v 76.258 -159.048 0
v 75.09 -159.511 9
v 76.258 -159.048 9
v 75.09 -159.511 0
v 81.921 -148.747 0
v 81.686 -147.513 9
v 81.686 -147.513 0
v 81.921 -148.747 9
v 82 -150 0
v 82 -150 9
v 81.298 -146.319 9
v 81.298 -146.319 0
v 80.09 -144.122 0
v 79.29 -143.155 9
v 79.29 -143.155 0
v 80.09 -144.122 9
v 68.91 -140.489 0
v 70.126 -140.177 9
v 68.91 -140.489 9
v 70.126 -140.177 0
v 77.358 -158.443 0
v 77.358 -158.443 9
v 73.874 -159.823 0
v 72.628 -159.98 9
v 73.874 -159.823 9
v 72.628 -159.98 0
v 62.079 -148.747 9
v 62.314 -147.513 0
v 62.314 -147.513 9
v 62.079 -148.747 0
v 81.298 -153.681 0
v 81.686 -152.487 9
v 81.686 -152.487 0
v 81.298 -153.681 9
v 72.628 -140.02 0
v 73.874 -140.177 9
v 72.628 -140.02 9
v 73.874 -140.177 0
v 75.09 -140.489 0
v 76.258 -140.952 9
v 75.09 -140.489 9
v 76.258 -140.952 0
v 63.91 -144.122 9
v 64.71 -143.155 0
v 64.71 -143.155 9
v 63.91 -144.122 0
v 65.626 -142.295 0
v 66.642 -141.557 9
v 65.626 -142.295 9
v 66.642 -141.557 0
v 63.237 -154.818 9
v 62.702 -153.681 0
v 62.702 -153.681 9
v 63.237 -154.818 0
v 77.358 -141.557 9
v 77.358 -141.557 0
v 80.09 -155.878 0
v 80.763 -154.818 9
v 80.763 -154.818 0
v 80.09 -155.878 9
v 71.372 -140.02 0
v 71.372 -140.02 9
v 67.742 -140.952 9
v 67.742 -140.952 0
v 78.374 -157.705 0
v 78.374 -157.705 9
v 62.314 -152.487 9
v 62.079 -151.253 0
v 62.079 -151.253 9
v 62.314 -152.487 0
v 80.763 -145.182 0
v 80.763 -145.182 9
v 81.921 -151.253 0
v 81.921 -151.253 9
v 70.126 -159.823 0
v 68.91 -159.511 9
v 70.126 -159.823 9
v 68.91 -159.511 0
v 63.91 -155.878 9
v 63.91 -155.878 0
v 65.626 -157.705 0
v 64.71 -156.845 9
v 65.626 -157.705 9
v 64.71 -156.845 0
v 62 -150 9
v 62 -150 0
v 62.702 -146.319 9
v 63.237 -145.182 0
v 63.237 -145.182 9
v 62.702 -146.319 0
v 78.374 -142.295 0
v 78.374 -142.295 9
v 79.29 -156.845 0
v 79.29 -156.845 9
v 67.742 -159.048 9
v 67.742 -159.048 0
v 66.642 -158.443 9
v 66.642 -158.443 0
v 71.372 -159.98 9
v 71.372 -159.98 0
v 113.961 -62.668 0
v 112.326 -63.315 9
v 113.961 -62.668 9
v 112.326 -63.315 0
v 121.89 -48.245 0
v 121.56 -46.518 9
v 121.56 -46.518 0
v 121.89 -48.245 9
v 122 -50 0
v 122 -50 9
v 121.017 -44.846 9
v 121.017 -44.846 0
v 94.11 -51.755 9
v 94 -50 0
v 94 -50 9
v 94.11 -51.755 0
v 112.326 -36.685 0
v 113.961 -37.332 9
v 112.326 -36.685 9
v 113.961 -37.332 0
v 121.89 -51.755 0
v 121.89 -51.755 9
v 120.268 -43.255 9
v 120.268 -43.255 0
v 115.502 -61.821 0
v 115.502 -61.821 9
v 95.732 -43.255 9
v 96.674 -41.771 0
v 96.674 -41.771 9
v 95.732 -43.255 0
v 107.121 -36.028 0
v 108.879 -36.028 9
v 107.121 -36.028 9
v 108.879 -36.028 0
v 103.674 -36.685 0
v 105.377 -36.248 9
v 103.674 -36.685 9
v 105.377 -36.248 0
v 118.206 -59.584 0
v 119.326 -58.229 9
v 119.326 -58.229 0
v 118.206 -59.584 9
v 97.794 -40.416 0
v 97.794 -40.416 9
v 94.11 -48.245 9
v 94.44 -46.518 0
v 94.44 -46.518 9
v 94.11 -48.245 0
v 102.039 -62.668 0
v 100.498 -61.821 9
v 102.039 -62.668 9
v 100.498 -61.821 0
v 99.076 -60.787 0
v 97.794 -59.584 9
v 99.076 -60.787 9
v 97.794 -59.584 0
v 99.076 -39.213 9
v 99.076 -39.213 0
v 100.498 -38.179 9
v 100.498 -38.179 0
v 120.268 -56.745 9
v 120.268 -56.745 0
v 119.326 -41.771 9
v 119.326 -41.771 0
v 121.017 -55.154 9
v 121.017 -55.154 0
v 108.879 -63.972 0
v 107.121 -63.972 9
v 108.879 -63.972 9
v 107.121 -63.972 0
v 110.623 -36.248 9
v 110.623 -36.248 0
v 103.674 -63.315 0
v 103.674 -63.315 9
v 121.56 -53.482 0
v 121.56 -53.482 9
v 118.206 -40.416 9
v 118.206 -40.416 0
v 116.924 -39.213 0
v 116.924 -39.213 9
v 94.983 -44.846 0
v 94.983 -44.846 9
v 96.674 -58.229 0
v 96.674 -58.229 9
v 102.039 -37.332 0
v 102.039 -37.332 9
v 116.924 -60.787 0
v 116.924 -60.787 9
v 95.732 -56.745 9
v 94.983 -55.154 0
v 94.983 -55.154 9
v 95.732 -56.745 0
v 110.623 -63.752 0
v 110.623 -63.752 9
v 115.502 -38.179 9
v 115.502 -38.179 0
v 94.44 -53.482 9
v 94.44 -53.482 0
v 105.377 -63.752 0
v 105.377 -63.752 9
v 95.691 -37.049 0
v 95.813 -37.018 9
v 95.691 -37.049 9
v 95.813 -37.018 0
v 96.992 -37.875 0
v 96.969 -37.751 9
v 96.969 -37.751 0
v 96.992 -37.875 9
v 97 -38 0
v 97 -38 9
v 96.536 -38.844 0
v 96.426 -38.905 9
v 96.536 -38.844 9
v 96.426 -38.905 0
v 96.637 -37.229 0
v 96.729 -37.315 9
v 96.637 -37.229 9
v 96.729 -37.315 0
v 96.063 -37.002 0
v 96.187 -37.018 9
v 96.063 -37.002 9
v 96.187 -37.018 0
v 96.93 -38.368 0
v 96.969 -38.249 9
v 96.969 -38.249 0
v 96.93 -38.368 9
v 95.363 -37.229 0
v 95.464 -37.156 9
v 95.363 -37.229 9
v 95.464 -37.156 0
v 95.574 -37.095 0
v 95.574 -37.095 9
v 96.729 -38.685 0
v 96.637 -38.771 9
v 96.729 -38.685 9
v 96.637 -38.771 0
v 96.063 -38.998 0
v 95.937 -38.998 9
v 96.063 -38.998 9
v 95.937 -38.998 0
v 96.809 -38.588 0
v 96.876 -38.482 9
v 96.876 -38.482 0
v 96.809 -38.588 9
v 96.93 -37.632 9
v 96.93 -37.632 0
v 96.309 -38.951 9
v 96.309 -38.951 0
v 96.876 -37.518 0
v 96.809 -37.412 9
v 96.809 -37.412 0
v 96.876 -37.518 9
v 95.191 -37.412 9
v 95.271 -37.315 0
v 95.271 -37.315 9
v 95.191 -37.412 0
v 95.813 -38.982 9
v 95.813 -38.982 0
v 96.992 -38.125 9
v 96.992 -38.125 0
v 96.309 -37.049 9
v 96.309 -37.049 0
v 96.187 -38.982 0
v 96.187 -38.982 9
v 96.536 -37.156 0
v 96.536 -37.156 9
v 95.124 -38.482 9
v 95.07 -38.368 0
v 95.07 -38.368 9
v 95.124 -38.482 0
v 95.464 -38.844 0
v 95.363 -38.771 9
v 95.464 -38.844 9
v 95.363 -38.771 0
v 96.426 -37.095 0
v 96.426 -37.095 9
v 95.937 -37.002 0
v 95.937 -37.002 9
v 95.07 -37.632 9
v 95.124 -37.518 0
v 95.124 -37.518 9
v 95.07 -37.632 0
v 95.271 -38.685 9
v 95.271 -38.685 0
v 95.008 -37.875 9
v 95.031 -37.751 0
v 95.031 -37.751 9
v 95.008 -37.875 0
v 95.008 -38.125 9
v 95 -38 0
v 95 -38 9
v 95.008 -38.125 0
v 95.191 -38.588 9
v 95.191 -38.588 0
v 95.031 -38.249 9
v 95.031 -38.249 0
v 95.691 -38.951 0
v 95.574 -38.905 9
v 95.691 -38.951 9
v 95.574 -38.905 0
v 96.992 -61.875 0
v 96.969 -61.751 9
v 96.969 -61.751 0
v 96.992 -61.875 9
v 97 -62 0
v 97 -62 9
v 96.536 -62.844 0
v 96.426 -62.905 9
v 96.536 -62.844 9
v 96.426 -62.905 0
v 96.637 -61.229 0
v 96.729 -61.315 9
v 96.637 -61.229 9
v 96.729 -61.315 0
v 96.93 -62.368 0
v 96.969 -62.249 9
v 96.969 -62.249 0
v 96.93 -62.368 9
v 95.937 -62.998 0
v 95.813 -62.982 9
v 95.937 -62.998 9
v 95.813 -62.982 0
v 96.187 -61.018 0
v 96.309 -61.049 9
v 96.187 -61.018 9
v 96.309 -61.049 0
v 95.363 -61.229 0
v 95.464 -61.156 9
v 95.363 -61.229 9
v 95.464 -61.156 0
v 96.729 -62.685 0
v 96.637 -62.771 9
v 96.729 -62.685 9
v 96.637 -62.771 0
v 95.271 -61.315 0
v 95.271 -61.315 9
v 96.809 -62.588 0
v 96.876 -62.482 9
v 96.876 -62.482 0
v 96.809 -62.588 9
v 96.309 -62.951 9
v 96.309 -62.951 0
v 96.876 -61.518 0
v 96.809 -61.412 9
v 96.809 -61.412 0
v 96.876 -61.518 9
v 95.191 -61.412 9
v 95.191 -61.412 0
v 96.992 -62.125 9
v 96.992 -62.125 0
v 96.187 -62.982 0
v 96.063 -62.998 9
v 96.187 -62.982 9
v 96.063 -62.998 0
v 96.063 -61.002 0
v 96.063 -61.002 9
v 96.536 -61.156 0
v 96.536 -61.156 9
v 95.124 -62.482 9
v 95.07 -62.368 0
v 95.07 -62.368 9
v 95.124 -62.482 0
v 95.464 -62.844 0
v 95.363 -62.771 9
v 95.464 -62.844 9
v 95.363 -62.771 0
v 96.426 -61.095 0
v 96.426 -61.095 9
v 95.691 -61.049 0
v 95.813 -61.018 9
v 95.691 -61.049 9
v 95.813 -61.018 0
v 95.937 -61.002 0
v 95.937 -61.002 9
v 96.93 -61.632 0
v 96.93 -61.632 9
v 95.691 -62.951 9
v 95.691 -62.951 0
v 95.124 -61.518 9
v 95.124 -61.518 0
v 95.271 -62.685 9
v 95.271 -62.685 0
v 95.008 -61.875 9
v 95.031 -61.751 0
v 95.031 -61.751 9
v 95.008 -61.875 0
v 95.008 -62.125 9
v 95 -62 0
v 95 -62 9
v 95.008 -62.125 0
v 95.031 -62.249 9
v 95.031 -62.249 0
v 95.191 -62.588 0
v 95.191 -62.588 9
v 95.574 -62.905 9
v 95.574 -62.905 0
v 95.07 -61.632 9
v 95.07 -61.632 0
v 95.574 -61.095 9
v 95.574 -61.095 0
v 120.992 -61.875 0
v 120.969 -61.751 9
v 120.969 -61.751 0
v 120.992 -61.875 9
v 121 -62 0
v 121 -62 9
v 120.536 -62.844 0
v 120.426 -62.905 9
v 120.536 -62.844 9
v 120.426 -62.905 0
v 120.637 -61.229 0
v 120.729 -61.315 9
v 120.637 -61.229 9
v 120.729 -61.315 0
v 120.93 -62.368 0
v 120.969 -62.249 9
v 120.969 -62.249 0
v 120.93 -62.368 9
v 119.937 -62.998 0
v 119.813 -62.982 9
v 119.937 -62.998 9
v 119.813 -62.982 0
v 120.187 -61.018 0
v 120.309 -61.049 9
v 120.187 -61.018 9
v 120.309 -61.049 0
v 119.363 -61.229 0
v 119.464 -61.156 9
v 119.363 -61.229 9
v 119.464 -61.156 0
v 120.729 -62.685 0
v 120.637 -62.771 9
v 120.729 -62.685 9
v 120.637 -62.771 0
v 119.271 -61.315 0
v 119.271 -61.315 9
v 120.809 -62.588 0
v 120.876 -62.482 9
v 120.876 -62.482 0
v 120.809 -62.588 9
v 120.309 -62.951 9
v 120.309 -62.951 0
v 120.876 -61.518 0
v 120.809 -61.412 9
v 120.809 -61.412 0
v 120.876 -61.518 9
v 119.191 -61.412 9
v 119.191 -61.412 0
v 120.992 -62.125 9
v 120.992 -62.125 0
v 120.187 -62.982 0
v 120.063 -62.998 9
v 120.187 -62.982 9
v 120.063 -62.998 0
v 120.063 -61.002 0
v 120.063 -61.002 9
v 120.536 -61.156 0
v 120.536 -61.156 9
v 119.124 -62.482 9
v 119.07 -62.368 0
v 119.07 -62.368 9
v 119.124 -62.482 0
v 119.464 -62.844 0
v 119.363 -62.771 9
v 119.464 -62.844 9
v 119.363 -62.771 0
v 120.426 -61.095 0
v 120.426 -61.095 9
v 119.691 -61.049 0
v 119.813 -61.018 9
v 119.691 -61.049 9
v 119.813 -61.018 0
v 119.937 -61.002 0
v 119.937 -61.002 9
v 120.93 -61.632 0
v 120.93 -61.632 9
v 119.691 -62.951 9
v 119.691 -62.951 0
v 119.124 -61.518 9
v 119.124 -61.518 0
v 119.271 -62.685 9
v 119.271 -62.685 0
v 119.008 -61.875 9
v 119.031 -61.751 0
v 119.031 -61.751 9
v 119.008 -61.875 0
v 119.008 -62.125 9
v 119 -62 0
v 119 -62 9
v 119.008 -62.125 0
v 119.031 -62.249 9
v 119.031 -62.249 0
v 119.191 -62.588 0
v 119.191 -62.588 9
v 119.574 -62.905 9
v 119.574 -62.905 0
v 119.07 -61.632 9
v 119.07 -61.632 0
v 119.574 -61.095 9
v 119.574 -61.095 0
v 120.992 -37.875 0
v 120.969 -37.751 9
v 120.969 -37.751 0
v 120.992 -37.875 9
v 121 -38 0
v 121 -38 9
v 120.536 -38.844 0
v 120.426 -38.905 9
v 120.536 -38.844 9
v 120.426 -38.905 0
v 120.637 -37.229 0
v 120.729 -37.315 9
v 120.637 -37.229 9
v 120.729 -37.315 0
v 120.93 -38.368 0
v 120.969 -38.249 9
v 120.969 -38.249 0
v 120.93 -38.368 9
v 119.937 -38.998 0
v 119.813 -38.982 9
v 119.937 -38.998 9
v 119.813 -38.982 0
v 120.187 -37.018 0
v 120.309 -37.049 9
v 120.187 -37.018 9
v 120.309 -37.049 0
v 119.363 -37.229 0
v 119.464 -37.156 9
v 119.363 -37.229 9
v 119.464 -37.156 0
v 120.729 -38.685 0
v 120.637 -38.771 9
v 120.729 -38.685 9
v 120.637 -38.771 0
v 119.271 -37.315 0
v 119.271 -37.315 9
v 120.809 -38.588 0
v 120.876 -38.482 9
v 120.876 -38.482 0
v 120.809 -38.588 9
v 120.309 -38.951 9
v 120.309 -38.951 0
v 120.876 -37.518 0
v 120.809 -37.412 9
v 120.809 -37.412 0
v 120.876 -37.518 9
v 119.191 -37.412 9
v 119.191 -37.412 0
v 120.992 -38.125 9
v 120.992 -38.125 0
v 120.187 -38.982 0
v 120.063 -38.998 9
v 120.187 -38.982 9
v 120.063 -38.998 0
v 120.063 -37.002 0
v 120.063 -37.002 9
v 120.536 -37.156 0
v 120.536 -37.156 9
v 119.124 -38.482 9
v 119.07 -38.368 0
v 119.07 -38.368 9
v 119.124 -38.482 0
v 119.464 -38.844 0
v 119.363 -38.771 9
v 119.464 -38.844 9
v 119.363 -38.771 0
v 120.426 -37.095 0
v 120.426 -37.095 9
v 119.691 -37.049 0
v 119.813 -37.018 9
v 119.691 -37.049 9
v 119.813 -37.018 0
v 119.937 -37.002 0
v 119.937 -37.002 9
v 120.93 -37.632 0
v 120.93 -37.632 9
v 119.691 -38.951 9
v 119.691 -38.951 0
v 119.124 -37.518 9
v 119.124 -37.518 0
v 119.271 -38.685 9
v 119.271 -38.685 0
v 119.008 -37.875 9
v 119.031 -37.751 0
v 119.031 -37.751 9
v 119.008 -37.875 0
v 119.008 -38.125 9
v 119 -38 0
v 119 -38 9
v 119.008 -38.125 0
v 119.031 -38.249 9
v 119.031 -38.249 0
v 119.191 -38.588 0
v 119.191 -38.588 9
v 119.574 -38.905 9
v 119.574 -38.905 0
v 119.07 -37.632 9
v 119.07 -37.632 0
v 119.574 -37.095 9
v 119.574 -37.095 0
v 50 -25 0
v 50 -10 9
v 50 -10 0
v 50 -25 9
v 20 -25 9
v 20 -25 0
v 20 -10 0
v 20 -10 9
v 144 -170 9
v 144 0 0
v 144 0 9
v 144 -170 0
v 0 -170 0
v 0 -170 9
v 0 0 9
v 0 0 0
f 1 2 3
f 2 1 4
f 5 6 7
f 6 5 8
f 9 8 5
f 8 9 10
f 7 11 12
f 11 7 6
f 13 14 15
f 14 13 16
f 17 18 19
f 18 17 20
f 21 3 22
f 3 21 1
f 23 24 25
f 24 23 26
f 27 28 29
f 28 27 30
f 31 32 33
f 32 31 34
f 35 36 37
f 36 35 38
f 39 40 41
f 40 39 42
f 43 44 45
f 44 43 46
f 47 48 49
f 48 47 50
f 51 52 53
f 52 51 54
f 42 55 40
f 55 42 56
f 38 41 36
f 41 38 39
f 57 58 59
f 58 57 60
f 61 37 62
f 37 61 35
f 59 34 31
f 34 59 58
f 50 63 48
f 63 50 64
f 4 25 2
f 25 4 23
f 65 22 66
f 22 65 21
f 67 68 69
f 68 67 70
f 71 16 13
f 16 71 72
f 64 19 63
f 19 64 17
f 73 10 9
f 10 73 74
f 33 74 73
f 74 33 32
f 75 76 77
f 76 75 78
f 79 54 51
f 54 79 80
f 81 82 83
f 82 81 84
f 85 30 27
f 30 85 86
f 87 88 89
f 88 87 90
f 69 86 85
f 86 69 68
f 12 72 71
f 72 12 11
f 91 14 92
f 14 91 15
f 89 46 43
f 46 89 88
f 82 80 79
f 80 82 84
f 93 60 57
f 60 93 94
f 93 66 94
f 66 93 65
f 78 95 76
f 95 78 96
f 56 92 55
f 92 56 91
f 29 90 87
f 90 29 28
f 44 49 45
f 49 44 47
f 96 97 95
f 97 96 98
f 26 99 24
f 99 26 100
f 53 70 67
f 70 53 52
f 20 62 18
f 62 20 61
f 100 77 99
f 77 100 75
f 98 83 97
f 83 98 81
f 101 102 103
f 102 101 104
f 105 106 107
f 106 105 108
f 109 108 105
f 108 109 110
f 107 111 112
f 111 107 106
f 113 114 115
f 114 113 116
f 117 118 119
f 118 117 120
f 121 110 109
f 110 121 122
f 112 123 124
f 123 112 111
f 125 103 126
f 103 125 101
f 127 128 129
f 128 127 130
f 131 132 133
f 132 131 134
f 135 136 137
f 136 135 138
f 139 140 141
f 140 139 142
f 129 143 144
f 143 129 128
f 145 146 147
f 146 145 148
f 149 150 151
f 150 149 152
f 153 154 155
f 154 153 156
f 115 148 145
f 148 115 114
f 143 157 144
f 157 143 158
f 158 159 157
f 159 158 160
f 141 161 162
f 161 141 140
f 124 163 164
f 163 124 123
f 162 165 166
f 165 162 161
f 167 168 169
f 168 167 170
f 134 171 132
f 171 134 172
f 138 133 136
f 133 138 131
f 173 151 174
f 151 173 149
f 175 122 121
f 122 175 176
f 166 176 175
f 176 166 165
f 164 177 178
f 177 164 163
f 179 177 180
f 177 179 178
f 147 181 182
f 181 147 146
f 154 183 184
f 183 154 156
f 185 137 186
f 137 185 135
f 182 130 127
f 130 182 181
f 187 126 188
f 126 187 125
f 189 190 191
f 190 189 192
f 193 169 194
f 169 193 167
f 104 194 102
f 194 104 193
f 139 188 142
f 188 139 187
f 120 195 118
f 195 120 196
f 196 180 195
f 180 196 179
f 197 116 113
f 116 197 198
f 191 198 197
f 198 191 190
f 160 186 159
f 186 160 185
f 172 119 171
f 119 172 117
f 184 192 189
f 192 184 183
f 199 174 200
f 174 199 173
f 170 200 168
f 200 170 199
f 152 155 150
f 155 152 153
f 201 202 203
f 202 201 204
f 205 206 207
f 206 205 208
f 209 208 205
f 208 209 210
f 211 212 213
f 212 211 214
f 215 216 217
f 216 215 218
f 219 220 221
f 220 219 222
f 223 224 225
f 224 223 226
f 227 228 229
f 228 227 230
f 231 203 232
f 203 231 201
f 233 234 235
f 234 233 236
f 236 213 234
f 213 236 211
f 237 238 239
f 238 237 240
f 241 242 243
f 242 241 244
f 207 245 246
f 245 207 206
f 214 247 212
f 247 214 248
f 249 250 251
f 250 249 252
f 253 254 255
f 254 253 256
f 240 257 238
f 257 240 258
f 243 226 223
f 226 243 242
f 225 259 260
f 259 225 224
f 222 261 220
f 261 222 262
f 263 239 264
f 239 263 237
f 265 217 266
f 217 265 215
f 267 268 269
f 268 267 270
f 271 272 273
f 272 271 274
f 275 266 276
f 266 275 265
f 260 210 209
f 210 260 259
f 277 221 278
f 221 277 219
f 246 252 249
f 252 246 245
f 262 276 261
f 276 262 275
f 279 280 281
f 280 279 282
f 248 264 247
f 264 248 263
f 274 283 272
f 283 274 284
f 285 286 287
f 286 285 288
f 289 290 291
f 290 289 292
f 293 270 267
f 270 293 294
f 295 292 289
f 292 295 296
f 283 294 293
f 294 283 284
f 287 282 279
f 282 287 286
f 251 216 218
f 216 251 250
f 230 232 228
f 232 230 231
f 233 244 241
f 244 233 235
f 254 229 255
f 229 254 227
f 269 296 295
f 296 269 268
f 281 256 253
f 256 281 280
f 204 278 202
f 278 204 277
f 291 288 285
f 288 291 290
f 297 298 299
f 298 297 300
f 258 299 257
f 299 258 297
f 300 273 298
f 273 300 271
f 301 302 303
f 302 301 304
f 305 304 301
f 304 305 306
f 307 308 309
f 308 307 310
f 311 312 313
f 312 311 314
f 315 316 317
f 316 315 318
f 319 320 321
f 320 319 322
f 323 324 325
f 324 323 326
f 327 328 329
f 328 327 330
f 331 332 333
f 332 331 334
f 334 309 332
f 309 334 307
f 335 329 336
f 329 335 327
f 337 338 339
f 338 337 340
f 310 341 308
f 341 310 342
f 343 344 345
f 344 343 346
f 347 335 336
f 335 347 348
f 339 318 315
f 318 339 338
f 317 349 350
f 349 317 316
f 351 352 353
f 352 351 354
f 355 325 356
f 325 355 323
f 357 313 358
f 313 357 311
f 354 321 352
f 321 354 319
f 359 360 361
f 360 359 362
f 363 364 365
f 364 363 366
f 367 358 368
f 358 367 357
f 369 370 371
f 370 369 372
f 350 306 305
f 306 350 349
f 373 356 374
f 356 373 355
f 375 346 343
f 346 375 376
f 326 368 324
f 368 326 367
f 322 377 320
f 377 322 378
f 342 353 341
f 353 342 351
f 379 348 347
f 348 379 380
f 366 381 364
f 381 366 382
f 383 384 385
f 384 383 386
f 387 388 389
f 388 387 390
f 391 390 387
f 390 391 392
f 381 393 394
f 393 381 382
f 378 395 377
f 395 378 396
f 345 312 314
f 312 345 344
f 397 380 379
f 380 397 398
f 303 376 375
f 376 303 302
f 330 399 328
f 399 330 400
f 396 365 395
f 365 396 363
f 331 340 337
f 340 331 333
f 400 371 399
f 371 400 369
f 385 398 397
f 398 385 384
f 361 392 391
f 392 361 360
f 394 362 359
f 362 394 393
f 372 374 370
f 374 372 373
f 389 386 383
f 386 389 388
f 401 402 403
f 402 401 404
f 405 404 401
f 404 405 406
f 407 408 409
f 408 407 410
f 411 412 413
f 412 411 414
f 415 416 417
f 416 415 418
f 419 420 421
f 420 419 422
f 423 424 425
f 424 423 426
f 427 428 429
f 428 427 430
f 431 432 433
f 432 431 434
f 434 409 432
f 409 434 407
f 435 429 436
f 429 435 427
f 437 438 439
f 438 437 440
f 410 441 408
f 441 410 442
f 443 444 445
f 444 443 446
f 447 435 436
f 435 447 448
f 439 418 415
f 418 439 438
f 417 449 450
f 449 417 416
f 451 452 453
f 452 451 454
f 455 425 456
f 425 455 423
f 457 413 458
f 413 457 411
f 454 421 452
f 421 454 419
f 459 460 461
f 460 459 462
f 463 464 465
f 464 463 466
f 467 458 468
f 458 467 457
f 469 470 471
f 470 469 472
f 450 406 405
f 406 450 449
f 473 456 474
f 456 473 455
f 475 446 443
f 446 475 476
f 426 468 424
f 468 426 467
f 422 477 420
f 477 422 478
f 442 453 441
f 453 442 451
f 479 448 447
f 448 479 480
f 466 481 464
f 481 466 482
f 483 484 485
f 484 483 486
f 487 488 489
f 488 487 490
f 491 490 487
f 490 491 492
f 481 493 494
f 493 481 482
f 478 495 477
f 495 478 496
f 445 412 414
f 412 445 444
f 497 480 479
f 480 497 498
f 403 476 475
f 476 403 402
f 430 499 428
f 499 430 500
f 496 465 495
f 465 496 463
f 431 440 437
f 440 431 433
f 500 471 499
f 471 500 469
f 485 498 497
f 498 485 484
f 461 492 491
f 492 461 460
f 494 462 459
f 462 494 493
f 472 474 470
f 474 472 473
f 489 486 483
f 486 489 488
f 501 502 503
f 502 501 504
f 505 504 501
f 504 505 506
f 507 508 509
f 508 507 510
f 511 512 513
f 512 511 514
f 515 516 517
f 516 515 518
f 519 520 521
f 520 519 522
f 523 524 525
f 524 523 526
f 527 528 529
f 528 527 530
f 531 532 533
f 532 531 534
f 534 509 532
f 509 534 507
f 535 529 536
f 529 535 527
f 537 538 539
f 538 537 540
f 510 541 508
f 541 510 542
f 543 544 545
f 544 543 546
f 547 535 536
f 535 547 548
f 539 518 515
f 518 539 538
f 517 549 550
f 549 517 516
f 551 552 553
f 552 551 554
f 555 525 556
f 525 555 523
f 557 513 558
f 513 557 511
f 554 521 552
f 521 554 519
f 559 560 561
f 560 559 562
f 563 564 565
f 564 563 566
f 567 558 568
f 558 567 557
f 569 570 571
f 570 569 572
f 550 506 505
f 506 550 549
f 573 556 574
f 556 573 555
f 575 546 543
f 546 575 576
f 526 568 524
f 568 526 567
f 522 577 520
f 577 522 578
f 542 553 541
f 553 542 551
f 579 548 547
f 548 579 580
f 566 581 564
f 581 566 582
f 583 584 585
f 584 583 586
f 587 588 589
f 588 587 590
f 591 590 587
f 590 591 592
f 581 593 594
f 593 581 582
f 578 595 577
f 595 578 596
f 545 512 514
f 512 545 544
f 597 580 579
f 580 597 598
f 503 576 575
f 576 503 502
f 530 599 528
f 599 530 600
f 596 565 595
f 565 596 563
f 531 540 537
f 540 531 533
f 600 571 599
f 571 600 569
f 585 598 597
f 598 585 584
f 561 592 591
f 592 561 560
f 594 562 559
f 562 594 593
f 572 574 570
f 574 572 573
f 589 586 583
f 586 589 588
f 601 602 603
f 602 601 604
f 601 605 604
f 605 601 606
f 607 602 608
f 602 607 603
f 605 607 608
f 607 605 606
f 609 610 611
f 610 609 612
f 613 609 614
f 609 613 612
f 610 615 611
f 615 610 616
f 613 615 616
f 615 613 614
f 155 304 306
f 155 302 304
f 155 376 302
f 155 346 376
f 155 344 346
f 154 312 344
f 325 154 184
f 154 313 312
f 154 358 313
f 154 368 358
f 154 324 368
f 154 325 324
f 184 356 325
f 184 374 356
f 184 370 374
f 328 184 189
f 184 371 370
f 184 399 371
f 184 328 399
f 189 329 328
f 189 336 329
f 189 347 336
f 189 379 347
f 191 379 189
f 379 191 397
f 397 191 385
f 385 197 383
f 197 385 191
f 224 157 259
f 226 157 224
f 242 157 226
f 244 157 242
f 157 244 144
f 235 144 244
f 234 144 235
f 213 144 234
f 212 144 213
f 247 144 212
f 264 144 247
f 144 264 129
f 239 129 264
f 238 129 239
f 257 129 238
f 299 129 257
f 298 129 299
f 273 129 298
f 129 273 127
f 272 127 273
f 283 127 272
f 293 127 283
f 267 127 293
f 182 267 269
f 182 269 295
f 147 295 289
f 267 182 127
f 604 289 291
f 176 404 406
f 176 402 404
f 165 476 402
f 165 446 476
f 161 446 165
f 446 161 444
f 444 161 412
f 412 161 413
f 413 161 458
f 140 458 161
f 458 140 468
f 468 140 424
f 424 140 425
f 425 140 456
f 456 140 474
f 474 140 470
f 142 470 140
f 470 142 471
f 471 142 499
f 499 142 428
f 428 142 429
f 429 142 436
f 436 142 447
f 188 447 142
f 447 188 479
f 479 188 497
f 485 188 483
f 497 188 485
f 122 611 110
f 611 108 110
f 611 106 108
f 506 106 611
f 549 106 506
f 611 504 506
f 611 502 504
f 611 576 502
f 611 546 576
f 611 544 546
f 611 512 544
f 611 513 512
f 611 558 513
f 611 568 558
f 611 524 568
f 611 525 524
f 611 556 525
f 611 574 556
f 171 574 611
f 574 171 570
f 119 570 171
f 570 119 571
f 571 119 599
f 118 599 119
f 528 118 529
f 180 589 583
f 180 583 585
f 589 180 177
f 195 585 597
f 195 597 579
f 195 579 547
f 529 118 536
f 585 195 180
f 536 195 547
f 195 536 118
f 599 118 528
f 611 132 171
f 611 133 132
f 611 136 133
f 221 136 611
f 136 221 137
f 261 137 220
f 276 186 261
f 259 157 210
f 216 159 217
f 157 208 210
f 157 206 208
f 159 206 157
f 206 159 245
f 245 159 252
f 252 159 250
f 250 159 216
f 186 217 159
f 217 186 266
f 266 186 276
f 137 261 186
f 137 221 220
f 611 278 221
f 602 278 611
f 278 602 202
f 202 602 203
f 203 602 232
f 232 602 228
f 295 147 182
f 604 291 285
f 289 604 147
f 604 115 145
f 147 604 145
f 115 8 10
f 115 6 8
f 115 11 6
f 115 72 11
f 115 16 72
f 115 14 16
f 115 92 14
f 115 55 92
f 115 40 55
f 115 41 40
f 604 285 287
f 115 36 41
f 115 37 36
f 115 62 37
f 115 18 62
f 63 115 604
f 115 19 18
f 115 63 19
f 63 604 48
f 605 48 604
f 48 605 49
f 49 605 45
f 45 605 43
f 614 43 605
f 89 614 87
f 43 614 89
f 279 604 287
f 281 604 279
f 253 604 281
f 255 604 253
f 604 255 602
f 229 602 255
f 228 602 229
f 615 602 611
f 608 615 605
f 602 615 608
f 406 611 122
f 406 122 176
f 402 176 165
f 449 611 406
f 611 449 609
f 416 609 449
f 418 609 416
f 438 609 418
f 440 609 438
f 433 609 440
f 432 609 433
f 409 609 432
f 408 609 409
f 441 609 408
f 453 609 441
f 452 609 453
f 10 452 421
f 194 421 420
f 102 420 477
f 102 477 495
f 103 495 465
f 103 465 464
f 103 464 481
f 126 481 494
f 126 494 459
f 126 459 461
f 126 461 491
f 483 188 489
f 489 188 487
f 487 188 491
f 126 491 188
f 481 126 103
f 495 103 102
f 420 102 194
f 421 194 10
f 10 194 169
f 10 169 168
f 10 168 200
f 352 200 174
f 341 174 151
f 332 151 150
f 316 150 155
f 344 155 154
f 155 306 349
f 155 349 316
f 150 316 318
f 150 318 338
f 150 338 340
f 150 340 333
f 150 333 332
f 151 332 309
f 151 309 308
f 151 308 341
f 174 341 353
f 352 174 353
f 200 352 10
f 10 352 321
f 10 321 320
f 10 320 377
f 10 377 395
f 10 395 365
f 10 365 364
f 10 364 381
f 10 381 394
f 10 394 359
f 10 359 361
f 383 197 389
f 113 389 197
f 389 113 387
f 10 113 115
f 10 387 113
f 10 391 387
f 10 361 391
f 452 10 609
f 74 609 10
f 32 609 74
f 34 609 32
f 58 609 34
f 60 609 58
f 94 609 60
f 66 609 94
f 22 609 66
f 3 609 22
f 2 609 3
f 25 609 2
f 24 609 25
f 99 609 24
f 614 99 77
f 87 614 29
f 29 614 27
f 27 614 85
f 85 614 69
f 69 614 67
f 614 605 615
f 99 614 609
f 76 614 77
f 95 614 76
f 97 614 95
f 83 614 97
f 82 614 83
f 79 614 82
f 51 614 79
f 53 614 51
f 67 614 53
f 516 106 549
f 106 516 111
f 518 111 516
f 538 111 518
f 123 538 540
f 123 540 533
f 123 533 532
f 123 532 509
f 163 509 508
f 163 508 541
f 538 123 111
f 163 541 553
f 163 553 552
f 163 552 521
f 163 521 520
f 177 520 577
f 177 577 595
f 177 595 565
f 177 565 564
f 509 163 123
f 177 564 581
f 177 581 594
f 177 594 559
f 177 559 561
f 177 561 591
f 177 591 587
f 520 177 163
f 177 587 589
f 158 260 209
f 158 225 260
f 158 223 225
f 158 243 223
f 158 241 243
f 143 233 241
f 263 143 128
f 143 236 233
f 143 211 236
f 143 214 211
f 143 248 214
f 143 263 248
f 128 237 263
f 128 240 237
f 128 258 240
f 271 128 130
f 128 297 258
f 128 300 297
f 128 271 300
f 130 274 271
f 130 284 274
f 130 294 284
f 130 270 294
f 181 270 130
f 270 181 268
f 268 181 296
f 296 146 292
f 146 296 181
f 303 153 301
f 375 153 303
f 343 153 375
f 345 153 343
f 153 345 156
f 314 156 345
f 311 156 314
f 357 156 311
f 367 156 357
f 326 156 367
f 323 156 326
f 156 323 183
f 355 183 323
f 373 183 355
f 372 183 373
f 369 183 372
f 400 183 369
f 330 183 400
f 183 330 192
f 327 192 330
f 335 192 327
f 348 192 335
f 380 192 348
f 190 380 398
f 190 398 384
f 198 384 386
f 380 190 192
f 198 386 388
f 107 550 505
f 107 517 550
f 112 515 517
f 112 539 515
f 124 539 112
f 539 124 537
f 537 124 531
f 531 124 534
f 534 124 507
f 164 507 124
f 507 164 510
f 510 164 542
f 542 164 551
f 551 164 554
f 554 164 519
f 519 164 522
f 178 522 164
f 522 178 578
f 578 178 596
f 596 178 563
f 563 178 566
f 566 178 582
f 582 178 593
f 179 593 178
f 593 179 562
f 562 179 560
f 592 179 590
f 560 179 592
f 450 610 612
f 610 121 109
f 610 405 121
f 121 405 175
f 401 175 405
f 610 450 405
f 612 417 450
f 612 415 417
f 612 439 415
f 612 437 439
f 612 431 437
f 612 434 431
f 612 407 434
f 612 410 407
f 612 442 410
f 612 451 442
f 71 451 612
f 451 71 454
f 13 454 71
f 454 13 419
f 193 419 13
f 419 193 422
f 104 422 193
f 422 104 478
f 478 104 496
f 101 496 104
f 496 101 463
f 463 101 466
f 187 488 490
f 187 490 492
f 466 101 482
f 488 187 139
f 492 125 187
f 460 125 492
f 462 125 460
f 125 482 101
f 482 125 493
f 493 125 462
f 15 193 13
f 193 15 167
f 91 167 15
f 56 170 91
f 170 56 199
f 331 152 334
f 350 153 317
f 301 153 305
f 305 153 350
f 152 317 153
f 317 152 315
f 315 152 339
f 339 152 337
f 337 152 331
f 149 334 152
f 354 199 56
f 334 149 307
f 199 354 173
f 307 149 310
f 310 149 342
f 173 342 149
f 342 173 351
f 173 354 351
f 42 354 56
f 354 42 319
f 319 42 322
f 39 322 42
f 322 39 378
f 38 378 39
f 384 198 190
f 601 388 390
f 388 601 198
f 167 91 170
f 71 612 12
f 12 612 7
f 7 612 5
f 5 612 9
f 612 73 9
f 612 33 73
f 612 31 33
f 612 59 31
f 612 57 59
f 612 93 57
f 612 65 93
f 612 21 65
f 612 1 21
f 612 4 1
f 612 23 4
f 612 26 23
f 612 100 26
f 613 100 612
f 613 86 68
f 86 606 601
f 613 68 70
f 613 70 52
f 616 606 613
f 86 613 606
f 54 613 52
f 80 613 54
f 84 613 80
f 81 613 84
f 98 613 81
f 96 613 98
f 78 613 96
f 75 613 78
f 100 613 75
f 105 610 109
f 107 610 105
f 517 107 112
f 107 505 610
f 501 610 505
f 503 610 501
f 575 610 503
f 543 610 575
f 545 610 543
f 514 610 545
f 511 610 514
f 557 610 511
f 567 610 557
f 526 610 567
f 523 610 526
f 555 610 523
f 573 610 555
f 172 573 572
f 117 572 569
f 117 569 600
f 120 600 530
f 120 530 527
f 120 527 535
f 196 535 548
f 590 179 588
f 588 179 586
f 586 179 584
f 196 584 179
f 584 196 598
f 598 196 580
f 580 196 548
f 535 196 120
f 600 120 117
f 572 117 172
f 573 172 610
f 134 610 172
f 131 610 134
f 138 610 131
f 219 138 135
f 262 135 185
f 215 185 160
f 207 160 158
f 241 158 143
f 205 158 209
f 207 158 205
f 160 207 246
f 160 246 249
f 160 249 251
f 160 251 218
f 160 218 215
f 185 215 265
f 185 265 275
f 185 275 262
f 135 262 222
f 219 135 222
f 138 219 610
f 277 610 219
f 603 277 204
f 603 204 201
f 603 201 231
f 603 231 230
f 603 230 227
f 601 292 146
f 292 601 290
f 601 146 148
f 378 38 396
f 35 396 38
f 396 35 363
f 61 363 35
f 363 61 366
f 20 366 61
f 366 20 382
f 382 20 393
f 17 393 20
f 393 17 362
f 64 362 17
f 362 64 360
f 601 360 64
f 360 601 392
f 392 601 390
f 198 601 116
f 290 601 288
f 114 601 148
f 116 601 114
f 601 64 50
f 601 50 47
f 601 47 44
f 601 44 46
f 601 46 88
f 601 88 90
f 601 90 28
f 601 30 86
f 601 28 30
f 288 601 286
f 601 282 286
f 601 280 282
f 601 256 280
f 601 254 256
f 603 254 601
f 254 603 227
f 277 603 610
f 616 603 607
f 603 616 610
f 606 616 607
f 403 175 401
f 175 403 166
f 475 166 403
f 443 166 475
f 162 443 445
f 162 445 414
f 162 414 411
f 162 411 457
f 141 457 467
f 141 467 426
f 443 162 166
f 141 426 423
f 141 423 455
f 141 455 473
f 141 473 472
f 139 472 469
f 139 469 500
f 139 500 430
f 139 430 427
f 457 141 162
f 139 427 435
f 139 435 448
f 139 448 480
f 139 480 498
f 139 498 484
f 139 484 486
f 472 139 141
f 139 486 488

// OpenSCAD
rotate(a=90,v=[1,0,0])
difference() {
    cube([144,9,170]);
    
    union() {
        translate([72,-1,150])
        rotate(a=90,v=[-1,0,0]) {
            cylinder(r=10,h=11,$fn=50);
        }
        
        translate([108,-1,50])
        rotate(a=90,v=[-1,0,0]) {
            cylinder(r=14,h=11,$fn=50);
        }
        
        translate([96,-1,38])
        rotate(a=90,v=[-1,0,0]) {
            cylinder(r=1,h=11,$fn=50);
        }
        translate([96,-1,62])
        rotate(a=90,v=[-1,0,0]) {
            cylinder(r=1,h=11,$fn=50);
        }
        translate([120,-1,62])
        rotate(a=90,v=[-1,0,0]) {
            cylinder(r=1,h=11,$fn=50);
        }
        translate([120,-1,38])
        rotate(a=90,v=[-1,0,0]) {
            cylinder(r=1,h=11,$fn=50);
        }
        
        translate([20,-1,10])
        cube([30,11,15]);
    }
}
